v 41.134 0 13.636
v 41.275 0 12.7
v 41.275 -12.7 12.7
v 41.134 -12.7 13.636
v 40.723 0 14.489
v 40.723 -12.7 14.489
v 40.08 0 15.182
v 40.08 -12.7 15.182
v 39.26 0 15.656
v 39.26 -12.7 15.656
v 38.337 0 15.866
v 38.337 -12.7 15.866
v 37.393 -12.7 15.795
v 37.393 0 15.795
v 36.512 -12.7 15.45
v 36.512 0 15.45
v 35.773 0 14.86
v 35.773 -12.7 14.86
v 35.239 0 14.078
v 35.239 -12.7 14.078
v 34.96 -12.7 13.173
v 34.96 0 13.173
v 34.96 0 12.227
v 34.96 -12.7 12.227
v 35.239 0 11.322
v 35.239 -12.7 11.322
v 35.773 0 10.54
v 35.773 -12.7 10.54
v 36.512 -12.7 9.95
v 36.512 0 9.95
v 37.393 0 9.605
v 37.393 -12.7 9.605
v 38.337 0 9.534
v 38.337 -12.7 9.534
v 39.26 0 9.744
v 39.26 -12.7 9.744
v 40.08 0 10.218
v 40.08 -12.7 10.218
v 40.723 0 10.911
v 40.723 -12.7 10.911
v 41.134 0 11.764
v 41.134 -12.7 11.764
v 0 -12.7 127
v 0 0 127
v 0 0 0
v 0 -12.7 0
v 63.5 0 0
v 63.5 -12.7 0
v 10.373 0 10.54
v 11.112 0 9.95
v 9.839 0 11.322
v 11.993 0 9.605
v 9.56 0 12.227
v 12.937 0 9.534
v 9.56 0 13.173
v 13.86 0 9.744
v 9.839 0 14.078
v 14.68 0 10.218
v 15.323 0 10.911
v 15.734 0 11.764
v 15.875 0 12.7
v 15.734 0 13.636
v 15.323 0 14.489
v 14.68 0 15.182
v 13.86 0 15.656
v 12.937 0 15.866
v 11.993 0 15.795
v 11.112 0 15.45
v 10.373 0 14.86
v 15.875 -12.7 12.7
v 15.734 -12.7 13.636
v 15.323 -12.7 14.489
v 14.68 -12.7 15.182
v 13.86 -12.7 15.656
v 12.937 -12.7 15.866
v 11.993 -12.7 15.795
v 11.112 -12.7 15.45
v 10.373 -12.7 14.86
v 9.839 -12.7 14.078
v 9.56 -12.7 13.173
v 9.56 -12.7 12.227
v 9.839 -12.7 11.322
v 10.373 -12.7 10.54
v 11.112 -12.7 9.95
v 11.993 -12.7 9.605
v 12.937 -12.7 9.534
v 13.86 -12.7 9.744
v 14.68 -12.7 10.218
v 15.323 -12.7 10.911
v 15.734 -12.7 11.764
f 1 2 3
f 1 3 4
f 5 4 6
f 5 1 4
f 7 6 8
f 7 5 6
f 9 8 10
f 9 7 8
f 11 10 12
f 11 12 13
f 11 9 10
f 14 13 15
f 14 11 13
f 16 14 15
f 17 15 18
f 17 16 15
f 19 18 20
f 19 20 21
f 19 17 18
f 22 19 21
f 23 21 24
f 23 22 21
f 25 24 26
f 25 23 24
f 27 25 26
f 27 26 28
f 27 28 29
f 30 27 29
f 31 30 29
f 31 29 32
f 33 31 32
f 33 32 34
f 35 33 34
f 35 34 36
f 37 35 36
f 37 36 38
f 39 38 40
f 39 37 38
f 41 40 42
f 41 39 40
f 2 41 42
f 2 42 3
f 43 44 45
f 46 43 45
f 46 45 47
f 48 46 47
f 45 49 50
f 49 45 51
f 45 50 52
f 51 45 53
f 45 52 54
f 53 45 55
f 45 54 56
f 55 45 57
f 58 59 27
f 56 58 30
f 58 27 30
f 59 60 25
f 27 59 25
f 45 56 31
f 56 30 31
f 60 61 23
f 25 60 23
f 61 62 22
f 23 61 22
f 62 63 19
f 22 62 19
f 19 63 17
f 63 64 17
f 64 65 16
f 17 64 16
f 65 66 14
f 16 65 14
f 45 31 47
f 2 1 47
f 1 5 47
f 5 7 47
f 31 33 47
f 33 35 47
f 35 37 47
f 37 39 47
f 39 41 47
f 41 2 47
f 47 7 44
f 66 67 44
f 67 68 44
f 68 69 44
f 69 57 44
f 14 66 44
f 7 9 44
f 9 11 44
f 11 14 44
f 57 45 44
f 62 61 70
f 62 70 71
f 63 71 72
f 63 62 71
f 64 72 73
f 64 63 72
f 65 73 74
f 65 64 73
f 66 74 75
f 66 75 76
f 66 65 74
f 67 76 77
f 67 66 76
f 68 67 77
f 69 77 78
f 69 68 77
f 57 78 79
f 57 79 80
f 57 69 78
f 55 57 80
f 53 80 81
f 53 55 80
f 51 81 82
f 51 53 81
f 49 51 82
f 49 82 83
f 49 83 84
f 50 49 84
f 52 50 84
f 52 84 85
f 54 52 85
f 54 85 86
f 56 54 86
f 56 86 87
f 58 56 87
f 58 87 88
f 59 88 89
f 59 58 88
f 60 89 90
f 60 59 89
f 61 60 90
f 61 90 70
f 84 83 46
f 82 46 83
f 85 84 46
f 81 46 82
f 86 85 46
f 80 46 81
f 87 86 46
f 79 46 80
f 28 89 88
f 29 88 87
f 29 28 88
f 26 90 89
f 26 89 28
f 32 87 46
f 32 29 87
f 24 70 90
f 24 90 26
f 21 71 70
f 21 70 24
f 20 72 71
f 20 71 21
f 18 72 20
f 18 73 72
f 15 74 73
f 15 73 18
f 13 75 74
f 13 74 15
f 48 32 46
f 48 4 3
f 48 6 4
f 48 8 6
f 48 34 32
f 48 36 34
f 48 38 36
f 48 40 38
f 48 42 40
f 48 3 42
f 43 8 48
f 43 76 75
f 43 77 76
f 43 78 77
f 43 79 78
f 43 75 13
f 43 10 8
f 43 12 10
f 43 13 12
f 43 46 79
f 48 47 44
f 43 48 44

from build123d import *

# Parameters (mm, degrees)
F0_R     = 3.175
F1_DEPTH = 12.7


with BuildPart() as f1:
    # F0 (on Front) → F1 (new body)
    with BuildSketch(Plane.XZ):
        Polygon((0, 127), (0, 0), (63.5, 0), align=None)
        with Locations((12.7, 12.7)):
            Circle(F0_R, mode=Mode.SUBTRACT)
        with Locations((38.1, 12.7)):
            Circle(F0_R, mode=Mode.SUBTRACT)
    extrude(amount=F1_DEPTH)


solid = f1.part
